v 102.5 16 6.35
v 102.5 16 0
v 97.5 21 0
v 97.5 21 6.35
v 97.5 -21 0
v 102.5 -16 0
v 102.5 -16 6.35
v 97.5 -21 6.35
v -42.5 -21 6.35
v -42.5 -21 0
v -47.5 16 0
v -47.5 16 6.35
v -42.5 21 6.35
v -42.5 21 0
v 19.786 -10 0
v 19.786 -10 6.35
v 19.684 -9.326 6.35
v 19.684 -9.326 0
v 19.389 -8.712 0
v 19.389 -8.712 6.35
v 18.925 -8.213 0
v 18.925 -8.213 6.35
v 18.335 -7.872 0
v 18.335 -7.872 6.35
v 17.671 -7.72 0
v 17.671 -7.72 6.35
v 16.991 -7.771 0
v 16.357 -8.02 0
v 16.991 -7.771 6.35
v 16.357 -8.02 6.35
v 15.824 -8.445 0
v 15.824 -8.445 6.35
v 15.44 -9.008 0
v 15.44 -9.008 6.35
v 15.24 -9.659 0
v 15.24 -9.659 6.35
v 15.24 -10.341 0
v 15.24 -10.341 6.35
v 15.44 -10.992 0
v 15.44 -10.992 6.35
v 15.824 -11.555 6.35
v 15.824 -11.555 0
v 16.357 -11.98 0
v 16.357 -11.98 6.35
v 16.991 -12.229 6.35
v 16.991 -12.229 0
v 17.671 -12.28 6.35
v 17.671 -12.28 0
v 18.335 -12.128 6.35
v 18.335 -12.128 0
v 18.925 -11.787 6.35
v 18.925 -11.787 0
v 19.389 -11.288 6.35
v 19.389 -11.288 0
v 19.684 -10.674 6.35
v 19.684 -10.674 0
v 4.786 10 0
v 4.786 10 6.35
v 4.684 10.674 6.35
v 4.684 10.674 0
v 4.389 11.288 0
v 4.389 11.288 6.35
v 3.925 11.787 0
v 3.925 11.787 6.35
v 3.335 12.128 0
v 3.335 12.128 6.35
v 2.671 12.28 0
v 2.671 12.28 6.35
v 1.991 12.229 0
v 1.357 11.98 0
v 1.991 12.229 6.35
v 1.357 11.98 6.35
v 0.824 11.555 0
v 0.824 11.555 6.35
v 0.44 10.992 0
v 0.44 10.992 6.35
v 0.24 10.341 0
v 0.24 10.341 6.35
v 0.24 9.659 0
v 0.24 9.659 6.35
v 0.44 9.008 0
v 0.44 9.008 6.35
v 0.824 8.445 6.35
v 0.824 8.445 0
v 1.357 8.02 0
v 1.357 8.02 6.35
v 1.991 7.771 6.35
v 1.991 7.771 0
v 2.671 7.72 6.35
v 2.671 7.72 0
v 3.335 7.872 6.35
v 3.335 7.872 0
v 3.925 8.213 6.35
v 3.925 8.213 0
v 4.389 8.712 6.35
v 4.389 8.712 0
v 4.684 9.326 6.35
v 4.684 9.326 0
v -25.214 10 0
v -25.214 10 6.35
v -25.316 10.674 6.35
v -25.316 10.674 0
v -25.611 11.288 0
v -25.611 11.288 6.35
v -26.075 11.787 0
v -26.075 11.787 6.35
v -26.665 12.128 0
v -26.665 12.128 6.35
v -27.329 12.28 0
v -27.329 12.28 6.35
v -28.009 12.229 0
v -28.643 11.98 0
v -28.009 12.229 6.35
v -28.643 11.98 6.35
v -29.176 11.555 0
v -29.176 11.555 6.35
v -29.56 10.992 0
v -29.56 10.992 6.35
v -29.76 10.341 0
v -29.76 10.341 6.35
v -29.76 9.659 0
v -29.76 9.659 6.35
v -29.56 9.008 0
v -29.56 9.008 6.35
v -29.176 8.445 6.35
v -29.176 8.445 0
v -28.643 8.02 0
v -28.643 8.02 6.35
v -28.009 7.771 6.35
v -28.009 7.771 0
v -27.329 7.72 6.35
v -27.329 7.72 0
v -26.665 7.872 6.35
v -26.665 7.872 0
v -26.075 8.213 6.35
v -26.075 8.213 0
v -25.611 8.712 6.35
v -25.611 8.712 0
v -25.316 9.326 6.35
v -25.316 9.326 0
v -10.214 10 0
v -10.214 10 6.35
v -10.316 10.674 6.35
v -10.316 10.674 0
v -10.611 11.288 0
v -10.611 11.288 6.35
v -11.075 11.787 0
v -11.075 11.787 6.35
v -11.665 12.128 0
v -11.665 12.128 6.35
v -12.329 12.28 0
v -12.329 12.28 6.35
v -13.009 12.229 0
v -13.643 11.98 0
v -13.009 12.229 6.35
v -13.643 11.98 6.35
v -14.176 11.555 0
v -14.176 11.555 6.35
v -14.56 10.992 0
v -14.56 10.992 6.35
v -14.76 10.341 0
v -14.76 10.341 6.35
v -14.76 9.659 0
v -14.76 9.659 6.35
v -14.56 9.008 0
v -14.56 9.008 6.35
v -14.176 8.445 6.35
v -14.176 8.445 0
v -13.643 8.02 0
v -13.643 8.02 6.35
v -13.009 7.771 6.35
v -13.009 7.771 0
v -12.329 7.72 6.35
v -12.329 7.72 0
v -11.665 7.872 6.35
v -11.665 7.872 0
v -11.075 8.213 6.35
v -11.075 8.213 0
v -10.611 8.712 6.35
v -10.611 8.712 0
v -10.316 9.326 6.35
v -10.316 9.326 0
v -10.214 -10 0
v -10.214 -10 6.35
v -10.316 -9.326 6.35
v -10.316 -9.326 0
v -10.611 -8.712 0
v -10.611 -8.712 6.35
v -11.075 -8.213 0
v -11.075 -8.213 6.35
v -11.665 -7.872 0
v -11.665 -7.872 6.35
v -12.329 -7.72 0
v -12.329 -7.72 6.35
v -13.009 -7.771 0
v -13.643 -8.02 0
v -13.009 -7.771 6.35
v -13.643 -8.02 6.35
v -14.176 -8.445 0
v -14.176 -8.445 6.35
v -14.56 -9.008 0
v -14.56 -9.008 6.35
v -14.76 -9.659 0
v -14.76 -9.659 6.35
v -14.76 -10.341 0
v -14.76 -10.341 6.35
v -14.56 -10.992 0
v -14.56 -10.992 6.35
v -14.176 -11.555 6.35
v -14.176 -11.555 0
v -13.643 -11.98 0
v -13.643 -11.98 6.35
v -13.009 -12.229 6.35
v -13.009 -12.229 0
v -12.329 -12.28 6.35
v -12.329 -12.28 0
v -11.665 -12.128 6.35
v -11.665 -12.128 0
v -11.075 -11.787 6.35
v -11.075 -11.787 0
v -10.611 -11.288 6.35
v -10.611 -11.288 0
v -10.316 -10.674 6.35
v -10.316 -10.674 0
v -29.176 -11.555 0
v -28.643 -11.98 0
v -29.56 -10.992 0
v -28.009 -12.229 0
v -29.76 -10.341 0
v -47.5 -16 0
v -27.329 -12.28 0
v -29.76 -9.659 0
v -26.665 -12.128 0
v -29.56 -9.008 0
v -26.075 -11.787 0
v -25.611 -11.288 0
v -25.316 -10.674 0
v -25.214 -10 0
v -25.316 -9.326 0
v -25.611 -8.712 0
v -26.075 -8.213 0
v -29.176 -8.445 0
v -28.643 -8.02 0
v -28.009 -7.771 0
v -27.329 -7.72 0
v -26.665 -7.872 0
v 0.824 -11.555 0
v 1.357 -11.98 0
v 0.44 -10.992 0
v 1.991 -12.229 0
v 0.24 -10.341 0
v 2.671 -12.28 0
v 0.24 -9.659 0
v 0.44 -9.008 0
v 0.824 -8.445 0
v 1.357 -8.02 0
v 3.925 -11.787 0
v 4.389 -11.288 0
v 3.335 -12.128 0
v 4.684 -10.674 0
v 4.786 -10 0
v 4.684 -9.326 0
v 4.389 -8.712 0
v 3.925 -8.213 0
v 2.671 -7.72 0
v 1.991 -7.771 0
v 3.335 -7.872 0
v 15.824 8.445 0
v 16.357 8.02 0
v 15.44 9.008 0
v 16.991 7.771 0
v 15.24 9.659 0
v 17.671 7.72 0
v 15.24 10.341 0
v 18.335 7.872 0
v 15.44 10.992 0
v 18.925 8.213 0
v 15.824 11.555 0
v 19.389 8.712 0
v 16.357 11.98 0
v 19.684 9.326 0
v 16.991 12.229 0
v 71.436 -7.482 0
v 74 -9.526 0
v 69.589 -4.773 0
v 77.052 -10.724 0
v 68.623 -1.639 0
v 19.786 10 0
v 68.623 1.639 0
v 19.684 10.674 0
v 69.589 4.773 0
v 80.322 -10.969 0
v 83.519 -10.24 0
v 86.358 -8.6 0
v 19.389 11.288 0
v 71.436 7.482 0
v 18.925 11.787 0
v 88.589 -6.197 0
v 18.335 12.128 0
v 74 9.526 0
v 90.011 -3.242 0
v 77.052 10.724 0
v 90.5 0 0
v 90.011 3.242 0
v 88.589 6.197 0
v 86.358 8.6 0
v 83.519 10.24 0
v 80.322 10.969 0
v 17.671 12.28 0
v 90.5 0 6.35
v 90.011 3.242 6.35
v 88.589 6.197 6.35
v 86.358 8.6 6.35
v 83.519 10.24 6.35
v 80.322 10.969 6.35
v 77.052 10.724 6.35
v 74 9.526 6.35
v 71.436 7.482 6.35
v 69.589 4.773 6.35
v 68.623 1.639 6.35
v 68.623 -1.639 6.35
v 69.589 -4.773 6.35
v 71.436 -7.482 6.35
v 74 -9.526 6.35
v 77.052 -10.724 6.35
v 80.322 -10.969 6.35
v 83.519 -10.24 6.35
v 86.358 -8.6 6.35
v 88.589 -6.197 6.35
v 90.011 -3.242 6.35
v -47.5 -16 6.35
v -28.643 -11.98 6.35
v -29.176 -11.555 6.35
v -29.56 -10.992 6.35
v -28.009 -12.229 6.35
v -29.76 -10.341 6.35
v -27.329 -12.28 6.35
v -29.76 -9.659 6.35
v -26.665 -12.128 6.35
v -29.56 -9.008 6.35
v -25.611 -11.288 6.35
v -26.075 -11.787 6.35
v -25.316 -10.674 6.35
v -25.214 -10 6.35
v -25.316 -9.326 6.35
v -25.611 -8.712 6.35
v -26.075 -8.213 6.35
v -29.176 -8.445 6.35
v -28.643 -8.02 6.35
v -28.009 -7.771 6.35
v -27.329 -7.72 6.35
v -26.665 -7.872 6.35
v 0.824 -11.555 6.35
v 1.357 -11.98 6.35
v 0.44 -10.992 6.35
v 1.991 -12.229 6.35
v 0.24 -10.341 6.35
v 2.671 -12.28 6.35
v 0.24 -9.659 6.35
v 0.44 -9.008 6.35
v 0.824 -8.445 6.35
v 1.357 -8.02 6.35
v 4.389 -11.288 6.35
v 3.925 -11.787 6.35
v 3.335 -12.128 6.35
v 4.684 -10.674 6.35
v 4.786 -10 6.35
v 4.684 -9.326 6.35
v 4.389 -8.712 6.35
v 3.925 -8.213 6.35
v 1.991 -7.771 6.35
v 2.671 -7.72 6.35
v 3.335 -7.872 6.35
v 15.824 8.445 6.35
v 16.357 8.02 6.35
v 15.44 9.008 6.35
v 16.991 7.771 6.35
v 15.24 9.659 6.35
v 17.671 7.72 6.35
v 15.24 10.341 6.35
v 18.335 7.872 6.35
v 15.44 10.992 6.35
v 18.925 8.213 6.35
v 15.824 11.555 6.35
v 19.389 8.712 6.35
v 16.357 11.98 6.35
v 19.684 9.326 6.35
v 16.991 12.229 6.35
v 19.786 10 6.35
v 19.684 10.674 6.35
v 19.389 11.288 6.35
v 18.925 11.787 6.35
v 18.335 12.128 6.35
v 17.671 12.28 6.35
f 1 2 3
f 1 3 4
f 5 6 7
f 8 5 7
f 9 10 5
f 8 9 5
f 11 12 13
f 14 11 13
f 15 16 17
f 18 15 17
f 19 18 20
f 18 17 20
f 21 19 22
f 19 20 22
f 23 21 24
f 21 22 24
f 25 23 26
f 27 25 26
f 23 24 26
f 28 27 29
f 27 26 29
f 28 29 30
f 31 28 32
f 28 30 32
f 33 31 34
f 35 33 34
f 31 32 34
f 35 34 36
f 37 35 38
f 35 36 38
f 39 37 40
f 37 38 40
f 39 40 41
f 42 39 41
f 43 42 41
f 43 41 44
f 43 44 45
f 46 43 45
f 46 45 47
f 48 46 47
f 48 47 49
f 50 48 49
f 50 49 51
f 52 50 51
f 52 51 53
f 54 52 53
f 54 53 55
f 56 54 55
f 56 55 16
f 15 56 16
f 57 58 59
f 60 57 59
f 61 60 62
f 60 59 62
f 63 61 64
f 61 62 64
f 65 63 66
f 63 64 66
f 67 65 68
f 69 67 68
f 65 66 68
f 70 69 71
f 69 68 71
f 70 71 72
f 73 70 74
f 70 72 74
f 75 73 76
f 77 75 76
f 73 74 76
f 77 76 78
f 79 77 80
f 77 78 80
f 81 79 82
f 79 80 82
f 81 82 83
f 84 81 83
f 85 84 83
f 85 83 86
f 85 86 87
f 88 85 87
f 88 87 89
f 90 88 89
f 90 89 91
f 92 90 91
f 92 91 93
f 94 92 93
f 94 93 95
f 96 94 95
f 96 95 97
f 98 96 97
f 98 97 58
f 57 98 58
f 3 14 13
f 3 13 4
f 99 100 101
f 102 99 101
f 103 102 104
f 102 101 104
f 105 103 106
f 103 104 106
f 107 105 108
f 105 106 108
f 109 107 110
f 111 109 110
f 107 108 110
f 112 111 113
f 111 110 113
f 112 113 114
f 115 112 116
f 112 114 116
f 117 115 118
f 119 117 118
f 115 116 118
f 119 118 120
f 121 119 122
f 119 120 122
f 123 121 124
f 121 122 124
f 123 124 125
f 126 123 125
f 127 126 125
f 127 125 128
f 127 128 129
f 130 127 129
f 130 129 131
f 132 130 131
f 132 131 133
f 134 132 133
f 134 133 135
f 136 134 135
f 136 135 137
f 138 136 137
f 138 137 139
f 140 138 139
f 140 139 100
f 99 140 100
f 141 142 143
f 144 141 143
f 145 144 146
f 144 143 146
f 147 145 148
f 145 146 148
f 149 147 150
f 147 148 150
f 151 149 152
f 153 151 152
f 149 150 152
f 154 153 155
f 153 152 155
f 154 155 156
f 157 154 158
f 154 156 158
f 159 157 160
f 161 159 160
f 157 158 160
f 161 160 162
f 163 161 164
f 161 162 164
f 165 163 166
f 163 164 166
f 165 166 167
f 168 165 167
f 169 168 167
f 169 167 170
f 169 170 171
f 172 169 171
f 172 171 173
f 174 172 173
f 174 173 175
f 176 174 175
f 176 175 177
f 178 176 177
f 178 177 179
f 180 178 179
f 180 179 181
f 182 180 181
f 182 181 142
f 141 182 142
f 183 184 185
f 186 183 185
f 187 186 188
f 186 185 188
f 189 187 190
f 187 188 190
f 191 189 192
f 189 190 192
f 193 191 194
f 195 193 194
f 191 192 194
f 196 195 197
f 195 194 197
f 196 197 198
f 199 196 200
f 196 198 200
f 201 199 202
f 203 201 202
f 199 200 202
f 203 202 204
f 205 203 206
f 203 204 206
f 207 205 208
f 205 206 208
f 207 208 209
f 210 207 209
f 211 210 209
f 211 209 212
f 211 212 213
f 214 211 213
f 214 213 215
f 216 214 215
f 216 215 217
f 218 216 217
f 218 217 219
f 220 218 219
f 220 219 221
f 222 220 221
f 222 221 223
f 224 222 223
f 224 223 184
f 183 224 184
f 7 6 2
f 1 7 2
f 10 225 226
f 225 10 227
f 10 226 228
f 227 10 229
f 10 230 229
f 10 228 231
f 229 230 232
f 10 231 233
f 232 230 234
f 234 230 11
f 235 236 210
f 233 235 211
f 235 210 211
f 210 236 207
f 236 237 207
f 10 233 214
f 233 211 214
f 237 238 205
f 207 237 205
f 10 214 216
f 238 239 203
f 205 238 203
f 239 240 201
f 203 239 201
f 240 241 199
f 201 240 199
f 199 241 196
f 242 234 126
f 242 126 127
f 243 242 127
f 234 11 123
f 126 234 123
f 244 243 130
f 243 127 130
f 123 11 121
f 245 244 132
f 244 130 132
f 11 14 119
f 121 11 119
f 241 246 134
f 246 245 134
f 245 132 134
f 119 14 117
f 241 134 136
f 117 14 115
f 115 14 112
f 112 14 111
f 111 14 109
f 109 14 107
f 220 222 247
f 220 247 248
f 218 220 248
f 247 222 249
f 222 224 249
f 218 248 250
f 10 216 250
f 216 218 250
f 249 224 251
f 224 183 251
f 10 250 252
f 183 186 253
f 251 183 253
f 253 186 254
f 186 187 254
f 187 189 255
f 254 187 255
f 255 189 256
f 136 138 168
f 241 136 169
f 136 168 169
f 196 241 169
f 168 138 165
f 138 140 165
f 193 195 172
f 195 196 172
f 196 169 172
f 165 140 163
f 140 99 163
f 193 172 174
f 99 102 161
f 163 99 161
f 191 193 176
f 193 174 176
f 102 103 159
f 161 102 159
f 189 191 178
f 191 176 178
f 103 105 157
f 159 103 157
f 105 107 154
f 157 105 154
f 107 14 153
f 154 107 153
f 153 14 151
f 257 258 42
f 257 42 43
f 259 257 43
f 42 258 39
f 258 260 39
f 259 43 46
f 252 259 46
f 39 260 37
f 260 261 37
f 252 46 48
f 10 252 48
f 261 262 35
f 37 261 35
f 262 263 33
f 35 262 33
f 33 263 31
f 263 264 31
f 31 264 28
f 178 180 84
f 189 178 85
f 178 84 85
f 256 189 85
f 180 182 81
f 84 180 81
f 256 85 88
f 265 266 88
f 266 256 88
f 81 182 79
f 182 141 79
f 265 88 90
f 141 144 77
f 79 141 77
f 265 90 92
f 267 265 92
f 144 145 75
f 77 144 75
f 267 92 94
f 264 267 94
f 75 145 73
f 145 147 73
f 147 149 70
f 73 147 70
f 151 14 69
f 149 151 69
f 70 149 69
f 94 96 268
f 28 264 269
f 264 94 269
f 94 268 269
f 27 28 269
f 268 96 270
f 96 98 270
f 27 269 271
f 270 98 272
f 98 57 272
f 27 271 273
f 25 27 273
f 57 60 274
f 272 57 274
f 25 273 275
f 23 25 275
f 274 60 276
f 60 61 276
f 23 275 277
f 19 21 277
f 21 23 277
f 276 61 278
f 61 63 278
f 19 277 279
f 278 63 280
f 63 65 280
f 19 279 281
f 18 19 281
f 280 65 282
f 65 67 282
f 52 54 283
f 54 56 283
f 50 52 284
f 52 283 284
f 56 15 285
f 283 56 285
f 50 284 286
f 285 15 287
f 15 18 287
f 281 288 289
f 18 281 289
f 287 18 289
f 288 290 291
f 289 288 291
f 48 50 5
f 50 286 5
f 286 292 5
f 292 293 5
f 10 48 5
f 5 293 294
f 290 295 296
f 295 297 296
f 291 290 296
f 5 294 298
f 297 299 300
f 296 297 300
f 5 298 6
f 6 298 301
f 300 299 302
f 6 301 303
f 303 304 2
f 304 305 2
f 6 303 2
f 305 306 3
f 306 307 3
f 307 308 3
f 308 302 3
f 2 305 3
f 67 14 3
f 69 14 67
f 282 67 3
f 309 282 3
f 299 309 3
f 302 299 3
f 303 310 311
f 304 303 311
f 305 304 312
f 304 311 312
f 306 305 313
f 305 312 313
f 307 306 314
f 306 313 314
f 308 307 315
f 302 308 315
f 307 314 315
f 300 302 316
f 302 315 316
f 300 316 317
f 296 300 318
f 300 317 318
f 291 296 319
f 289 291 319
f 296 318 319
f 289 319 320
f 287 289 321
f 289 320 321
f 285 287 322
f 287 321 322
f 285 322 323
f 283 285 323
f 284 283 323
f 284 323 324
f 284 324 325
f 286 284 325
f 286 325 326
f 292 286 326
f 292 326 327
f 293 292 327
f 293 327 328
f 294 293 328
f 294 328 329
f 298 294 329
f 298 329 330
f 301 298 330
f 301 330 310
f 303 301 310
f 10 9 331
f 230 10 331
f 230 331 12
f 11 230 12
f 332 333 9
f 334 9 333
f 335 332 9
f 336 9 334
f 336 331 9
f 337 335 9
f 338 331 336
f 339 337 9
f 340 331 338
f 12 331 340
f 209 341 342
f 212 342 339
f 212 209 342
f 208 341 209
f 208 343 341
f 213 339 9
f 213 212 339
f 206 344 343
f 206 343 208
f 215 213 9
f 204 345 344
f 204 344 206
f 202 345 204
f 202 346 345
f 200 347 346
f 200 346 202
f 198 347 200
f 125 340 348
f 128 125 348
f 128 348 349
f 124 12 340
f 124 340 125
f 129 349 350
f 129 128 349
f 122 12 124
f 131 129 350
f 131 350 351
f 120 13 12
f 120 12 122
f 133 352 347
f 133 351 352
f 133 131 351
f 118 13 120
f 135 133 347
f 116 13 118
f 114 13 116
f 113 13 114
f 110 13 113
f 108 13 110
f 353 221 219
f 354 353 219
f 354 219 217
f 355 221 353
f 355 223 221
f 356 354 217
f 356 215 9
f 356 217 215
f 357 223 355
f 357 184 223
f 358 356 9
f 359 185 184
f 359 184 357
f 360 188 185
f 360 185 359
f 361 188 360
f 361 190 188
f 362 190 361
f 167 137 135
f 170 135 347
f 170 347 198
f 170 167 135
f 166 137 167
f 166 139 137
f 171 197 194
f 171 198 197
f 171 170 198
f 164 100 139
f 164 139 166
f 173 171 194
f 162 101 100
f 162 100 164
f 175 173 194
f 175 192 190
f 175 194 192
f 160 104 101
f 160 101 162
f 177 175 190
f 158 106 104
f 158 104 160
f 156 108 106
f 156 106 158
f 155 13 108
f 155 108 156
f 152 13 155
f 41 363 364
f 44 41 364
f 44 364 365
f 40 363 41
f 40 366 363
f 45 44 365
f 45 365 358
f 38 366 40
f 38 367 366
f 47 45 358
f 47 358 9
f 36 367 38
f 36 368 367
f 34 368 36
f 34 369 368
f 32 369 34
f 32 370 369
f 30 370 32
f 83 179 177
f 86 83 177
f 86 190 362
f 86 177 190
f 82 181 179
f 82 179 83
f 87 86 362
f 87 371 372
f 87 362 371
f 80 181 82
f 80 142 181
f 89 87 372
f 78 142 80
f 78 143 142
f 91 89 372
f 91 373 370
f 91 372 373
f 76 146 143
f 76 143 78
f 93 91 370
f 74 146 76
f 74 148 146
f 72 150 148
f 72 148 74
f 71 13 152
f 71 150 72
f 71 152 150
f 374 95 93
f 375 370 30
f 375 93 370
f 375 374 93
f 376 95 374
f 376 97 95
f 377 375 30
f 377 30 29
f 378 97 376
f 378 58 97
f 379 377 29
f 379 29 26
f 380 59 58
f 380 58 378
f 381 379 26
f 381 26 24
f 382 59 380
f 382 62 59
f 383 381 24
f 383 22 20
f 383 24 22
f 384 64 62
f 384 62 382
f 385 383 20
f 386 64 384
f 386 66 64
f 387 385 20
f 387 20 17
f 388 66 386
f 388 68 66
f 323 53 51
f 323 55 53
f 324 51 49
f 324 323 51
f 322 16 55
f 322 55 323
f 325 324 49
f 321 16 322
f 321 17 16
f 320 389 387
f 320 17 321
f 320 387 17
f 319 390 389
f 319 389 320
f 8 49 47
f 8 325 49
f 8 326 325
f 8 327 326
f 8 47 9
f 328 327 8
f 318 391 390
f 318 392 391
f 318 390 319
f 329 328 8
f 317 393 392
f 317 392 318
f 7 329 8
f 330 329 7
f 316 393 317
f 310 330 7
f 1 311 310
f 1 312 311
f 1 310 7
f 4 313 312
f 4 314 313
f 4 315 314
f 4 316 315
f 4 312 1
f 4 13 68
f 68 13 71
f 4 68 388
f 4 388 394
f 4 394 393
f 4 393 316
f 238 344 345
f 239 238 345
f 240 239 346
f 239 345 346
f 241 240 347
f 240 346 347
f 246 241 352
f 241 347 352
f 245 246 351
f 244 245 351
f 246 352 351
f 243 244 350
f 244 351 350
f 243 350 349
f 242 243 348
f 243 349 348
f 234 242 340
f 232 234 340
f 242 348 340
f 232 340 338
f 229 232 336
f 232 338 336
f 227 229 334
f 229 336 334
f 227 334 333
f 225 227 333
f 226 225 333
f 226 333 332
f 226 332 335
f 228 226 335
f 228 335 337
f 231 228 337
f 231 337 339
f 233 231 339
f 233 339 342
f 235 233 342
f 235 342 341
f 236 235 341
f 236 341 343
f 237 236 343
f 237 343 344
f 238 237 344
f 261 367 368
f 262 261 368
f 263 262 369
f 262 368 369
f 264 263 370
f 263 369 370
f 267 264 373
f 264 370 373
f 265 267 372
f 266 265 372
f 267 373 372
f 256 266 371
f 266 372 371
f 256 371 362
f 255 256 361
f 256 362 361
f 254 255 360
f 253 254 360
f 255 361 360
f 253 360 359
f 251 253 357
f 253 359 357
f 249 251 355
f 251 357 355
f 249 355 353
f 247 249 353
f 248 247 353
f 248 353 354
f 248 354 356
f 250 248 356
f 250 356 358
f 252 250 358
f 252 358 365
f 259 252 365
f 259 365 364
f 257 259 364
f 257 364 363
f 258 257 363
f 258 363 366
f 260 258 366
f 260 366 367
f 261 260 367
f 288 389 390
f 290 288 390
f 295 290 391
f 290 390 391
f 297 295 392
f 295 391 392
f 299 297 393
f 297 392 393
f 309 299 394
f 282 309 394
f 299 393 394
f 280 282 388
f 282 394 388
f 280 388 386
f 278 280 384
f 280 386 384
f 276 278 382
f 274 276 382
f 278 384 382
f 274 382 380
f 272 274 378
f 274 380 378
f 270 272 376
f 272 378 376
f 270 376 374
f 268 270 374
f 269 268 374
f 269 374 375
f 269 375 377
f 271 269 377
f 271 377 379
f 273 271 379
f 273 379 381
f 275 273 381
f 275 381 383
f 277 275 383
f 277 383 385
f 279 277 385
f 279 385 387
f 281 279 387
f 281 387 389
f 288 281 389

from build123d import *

# Parameters (mm, degrees)
SKETCH1_W           = 205
SKETCH1_H           = 42
BOSS_EXTRUDE1_DEPTH = 6.35
SKETCH4_R           = 11
CUT_EXTRUDE3_DEPTH  = 7.35
CHAMFER1_SIZE       = 5
SKETCH5_R           = 11
CUT_EXTRUDE4_DEPTH  = 25
SKETCH13_R          = 11
SKETCH13_R_2        = 2.286
CUT_EXTRUDE12_DEPTH = 10


with BuildPart() as part:
    # Sketch1 → Boss-Extrude1 (new body)
    with BuildSketch(Plane.XY):
        Rectangle(SKETCH1_W, SKETCH1_H)
    extrude(amount=BOSS_EXTRUDE1_DEPTH)

    # Sketch4 → Cut-Extrude3 (cut, through all)
    with BuildSketch(Plane.XY.offset(6.35)):
        with Locations((-78.5, 0)):
            Circle(SKETCH4_R)
    extrude(amount=-CUT_EXTRUDE3_DEPTH, mode=Mode.SUBTRACT)

    # Chamfer1
    chamfer1_edges = [part.edges().sort_by_distance(p)[0] for p in [
        (102.5, -21, 3.175),
        (-102.5, -21, 3.175),
        (-102.5, 21, 3.175),
        (102.5, 21, 3.175),
    ]]
    chamfer(chamfer1_edges, length=CHAMFER1_SIZE)

    # Sketch5 → Cut-Extrude4 (cut)
    with BuildSketch(Plane.XY.offset(6.35)):
        with Locations((79.5, 0)):
            Circle(SKETCH5_R)
    extrude(amount=-CUT_EXTRUDE4_DEPTH, mode=Mode.SUBTRACT)

    # Sketch13 → Cut-Extrude12 (cut)
    with BuildSketch(Plane.XY.offset(6.35)):
        Polygon((-47.5, -16), (-47.5, 16), (-42.5, 21), (-97.5, 21), (-102.5, 16), (-102.5, -16), (-97.5, -21), (-42.5, -21), align=None)
        with Locations((-78.5, 0)):
            Circle(SKETCH13_R, mode=Mode.SUBTRACT)
        with Locations((-27.5, 10)):
            Circle(SKETCH13_R_2)
        with Locations((-12.5, 10)):
            Circle(SKETCH13_R_2)
        with Locations((-12.5, -10)):
            Circle(SKETCH13_R_2)
        with Locations((-27.5, -10)):
            Circle(SKETCH13_R_2)
        with Locations((2.5, 10)):
            Circle(SKETCH13_R_2)
        with Locations((17.5, 10)):
            Circle(SKETCH13_R_2)
        with Locations((17.5, -10)):
            Circle(SKETCH13_R_2)
        with Locations((2.5, -10)):
            Circle(SKETCH13_R_2)
    extrude(amount=-CUT_EXTRUDE12_DEPTH, mode=Mode.SUBTRACT)


solid = part.part
